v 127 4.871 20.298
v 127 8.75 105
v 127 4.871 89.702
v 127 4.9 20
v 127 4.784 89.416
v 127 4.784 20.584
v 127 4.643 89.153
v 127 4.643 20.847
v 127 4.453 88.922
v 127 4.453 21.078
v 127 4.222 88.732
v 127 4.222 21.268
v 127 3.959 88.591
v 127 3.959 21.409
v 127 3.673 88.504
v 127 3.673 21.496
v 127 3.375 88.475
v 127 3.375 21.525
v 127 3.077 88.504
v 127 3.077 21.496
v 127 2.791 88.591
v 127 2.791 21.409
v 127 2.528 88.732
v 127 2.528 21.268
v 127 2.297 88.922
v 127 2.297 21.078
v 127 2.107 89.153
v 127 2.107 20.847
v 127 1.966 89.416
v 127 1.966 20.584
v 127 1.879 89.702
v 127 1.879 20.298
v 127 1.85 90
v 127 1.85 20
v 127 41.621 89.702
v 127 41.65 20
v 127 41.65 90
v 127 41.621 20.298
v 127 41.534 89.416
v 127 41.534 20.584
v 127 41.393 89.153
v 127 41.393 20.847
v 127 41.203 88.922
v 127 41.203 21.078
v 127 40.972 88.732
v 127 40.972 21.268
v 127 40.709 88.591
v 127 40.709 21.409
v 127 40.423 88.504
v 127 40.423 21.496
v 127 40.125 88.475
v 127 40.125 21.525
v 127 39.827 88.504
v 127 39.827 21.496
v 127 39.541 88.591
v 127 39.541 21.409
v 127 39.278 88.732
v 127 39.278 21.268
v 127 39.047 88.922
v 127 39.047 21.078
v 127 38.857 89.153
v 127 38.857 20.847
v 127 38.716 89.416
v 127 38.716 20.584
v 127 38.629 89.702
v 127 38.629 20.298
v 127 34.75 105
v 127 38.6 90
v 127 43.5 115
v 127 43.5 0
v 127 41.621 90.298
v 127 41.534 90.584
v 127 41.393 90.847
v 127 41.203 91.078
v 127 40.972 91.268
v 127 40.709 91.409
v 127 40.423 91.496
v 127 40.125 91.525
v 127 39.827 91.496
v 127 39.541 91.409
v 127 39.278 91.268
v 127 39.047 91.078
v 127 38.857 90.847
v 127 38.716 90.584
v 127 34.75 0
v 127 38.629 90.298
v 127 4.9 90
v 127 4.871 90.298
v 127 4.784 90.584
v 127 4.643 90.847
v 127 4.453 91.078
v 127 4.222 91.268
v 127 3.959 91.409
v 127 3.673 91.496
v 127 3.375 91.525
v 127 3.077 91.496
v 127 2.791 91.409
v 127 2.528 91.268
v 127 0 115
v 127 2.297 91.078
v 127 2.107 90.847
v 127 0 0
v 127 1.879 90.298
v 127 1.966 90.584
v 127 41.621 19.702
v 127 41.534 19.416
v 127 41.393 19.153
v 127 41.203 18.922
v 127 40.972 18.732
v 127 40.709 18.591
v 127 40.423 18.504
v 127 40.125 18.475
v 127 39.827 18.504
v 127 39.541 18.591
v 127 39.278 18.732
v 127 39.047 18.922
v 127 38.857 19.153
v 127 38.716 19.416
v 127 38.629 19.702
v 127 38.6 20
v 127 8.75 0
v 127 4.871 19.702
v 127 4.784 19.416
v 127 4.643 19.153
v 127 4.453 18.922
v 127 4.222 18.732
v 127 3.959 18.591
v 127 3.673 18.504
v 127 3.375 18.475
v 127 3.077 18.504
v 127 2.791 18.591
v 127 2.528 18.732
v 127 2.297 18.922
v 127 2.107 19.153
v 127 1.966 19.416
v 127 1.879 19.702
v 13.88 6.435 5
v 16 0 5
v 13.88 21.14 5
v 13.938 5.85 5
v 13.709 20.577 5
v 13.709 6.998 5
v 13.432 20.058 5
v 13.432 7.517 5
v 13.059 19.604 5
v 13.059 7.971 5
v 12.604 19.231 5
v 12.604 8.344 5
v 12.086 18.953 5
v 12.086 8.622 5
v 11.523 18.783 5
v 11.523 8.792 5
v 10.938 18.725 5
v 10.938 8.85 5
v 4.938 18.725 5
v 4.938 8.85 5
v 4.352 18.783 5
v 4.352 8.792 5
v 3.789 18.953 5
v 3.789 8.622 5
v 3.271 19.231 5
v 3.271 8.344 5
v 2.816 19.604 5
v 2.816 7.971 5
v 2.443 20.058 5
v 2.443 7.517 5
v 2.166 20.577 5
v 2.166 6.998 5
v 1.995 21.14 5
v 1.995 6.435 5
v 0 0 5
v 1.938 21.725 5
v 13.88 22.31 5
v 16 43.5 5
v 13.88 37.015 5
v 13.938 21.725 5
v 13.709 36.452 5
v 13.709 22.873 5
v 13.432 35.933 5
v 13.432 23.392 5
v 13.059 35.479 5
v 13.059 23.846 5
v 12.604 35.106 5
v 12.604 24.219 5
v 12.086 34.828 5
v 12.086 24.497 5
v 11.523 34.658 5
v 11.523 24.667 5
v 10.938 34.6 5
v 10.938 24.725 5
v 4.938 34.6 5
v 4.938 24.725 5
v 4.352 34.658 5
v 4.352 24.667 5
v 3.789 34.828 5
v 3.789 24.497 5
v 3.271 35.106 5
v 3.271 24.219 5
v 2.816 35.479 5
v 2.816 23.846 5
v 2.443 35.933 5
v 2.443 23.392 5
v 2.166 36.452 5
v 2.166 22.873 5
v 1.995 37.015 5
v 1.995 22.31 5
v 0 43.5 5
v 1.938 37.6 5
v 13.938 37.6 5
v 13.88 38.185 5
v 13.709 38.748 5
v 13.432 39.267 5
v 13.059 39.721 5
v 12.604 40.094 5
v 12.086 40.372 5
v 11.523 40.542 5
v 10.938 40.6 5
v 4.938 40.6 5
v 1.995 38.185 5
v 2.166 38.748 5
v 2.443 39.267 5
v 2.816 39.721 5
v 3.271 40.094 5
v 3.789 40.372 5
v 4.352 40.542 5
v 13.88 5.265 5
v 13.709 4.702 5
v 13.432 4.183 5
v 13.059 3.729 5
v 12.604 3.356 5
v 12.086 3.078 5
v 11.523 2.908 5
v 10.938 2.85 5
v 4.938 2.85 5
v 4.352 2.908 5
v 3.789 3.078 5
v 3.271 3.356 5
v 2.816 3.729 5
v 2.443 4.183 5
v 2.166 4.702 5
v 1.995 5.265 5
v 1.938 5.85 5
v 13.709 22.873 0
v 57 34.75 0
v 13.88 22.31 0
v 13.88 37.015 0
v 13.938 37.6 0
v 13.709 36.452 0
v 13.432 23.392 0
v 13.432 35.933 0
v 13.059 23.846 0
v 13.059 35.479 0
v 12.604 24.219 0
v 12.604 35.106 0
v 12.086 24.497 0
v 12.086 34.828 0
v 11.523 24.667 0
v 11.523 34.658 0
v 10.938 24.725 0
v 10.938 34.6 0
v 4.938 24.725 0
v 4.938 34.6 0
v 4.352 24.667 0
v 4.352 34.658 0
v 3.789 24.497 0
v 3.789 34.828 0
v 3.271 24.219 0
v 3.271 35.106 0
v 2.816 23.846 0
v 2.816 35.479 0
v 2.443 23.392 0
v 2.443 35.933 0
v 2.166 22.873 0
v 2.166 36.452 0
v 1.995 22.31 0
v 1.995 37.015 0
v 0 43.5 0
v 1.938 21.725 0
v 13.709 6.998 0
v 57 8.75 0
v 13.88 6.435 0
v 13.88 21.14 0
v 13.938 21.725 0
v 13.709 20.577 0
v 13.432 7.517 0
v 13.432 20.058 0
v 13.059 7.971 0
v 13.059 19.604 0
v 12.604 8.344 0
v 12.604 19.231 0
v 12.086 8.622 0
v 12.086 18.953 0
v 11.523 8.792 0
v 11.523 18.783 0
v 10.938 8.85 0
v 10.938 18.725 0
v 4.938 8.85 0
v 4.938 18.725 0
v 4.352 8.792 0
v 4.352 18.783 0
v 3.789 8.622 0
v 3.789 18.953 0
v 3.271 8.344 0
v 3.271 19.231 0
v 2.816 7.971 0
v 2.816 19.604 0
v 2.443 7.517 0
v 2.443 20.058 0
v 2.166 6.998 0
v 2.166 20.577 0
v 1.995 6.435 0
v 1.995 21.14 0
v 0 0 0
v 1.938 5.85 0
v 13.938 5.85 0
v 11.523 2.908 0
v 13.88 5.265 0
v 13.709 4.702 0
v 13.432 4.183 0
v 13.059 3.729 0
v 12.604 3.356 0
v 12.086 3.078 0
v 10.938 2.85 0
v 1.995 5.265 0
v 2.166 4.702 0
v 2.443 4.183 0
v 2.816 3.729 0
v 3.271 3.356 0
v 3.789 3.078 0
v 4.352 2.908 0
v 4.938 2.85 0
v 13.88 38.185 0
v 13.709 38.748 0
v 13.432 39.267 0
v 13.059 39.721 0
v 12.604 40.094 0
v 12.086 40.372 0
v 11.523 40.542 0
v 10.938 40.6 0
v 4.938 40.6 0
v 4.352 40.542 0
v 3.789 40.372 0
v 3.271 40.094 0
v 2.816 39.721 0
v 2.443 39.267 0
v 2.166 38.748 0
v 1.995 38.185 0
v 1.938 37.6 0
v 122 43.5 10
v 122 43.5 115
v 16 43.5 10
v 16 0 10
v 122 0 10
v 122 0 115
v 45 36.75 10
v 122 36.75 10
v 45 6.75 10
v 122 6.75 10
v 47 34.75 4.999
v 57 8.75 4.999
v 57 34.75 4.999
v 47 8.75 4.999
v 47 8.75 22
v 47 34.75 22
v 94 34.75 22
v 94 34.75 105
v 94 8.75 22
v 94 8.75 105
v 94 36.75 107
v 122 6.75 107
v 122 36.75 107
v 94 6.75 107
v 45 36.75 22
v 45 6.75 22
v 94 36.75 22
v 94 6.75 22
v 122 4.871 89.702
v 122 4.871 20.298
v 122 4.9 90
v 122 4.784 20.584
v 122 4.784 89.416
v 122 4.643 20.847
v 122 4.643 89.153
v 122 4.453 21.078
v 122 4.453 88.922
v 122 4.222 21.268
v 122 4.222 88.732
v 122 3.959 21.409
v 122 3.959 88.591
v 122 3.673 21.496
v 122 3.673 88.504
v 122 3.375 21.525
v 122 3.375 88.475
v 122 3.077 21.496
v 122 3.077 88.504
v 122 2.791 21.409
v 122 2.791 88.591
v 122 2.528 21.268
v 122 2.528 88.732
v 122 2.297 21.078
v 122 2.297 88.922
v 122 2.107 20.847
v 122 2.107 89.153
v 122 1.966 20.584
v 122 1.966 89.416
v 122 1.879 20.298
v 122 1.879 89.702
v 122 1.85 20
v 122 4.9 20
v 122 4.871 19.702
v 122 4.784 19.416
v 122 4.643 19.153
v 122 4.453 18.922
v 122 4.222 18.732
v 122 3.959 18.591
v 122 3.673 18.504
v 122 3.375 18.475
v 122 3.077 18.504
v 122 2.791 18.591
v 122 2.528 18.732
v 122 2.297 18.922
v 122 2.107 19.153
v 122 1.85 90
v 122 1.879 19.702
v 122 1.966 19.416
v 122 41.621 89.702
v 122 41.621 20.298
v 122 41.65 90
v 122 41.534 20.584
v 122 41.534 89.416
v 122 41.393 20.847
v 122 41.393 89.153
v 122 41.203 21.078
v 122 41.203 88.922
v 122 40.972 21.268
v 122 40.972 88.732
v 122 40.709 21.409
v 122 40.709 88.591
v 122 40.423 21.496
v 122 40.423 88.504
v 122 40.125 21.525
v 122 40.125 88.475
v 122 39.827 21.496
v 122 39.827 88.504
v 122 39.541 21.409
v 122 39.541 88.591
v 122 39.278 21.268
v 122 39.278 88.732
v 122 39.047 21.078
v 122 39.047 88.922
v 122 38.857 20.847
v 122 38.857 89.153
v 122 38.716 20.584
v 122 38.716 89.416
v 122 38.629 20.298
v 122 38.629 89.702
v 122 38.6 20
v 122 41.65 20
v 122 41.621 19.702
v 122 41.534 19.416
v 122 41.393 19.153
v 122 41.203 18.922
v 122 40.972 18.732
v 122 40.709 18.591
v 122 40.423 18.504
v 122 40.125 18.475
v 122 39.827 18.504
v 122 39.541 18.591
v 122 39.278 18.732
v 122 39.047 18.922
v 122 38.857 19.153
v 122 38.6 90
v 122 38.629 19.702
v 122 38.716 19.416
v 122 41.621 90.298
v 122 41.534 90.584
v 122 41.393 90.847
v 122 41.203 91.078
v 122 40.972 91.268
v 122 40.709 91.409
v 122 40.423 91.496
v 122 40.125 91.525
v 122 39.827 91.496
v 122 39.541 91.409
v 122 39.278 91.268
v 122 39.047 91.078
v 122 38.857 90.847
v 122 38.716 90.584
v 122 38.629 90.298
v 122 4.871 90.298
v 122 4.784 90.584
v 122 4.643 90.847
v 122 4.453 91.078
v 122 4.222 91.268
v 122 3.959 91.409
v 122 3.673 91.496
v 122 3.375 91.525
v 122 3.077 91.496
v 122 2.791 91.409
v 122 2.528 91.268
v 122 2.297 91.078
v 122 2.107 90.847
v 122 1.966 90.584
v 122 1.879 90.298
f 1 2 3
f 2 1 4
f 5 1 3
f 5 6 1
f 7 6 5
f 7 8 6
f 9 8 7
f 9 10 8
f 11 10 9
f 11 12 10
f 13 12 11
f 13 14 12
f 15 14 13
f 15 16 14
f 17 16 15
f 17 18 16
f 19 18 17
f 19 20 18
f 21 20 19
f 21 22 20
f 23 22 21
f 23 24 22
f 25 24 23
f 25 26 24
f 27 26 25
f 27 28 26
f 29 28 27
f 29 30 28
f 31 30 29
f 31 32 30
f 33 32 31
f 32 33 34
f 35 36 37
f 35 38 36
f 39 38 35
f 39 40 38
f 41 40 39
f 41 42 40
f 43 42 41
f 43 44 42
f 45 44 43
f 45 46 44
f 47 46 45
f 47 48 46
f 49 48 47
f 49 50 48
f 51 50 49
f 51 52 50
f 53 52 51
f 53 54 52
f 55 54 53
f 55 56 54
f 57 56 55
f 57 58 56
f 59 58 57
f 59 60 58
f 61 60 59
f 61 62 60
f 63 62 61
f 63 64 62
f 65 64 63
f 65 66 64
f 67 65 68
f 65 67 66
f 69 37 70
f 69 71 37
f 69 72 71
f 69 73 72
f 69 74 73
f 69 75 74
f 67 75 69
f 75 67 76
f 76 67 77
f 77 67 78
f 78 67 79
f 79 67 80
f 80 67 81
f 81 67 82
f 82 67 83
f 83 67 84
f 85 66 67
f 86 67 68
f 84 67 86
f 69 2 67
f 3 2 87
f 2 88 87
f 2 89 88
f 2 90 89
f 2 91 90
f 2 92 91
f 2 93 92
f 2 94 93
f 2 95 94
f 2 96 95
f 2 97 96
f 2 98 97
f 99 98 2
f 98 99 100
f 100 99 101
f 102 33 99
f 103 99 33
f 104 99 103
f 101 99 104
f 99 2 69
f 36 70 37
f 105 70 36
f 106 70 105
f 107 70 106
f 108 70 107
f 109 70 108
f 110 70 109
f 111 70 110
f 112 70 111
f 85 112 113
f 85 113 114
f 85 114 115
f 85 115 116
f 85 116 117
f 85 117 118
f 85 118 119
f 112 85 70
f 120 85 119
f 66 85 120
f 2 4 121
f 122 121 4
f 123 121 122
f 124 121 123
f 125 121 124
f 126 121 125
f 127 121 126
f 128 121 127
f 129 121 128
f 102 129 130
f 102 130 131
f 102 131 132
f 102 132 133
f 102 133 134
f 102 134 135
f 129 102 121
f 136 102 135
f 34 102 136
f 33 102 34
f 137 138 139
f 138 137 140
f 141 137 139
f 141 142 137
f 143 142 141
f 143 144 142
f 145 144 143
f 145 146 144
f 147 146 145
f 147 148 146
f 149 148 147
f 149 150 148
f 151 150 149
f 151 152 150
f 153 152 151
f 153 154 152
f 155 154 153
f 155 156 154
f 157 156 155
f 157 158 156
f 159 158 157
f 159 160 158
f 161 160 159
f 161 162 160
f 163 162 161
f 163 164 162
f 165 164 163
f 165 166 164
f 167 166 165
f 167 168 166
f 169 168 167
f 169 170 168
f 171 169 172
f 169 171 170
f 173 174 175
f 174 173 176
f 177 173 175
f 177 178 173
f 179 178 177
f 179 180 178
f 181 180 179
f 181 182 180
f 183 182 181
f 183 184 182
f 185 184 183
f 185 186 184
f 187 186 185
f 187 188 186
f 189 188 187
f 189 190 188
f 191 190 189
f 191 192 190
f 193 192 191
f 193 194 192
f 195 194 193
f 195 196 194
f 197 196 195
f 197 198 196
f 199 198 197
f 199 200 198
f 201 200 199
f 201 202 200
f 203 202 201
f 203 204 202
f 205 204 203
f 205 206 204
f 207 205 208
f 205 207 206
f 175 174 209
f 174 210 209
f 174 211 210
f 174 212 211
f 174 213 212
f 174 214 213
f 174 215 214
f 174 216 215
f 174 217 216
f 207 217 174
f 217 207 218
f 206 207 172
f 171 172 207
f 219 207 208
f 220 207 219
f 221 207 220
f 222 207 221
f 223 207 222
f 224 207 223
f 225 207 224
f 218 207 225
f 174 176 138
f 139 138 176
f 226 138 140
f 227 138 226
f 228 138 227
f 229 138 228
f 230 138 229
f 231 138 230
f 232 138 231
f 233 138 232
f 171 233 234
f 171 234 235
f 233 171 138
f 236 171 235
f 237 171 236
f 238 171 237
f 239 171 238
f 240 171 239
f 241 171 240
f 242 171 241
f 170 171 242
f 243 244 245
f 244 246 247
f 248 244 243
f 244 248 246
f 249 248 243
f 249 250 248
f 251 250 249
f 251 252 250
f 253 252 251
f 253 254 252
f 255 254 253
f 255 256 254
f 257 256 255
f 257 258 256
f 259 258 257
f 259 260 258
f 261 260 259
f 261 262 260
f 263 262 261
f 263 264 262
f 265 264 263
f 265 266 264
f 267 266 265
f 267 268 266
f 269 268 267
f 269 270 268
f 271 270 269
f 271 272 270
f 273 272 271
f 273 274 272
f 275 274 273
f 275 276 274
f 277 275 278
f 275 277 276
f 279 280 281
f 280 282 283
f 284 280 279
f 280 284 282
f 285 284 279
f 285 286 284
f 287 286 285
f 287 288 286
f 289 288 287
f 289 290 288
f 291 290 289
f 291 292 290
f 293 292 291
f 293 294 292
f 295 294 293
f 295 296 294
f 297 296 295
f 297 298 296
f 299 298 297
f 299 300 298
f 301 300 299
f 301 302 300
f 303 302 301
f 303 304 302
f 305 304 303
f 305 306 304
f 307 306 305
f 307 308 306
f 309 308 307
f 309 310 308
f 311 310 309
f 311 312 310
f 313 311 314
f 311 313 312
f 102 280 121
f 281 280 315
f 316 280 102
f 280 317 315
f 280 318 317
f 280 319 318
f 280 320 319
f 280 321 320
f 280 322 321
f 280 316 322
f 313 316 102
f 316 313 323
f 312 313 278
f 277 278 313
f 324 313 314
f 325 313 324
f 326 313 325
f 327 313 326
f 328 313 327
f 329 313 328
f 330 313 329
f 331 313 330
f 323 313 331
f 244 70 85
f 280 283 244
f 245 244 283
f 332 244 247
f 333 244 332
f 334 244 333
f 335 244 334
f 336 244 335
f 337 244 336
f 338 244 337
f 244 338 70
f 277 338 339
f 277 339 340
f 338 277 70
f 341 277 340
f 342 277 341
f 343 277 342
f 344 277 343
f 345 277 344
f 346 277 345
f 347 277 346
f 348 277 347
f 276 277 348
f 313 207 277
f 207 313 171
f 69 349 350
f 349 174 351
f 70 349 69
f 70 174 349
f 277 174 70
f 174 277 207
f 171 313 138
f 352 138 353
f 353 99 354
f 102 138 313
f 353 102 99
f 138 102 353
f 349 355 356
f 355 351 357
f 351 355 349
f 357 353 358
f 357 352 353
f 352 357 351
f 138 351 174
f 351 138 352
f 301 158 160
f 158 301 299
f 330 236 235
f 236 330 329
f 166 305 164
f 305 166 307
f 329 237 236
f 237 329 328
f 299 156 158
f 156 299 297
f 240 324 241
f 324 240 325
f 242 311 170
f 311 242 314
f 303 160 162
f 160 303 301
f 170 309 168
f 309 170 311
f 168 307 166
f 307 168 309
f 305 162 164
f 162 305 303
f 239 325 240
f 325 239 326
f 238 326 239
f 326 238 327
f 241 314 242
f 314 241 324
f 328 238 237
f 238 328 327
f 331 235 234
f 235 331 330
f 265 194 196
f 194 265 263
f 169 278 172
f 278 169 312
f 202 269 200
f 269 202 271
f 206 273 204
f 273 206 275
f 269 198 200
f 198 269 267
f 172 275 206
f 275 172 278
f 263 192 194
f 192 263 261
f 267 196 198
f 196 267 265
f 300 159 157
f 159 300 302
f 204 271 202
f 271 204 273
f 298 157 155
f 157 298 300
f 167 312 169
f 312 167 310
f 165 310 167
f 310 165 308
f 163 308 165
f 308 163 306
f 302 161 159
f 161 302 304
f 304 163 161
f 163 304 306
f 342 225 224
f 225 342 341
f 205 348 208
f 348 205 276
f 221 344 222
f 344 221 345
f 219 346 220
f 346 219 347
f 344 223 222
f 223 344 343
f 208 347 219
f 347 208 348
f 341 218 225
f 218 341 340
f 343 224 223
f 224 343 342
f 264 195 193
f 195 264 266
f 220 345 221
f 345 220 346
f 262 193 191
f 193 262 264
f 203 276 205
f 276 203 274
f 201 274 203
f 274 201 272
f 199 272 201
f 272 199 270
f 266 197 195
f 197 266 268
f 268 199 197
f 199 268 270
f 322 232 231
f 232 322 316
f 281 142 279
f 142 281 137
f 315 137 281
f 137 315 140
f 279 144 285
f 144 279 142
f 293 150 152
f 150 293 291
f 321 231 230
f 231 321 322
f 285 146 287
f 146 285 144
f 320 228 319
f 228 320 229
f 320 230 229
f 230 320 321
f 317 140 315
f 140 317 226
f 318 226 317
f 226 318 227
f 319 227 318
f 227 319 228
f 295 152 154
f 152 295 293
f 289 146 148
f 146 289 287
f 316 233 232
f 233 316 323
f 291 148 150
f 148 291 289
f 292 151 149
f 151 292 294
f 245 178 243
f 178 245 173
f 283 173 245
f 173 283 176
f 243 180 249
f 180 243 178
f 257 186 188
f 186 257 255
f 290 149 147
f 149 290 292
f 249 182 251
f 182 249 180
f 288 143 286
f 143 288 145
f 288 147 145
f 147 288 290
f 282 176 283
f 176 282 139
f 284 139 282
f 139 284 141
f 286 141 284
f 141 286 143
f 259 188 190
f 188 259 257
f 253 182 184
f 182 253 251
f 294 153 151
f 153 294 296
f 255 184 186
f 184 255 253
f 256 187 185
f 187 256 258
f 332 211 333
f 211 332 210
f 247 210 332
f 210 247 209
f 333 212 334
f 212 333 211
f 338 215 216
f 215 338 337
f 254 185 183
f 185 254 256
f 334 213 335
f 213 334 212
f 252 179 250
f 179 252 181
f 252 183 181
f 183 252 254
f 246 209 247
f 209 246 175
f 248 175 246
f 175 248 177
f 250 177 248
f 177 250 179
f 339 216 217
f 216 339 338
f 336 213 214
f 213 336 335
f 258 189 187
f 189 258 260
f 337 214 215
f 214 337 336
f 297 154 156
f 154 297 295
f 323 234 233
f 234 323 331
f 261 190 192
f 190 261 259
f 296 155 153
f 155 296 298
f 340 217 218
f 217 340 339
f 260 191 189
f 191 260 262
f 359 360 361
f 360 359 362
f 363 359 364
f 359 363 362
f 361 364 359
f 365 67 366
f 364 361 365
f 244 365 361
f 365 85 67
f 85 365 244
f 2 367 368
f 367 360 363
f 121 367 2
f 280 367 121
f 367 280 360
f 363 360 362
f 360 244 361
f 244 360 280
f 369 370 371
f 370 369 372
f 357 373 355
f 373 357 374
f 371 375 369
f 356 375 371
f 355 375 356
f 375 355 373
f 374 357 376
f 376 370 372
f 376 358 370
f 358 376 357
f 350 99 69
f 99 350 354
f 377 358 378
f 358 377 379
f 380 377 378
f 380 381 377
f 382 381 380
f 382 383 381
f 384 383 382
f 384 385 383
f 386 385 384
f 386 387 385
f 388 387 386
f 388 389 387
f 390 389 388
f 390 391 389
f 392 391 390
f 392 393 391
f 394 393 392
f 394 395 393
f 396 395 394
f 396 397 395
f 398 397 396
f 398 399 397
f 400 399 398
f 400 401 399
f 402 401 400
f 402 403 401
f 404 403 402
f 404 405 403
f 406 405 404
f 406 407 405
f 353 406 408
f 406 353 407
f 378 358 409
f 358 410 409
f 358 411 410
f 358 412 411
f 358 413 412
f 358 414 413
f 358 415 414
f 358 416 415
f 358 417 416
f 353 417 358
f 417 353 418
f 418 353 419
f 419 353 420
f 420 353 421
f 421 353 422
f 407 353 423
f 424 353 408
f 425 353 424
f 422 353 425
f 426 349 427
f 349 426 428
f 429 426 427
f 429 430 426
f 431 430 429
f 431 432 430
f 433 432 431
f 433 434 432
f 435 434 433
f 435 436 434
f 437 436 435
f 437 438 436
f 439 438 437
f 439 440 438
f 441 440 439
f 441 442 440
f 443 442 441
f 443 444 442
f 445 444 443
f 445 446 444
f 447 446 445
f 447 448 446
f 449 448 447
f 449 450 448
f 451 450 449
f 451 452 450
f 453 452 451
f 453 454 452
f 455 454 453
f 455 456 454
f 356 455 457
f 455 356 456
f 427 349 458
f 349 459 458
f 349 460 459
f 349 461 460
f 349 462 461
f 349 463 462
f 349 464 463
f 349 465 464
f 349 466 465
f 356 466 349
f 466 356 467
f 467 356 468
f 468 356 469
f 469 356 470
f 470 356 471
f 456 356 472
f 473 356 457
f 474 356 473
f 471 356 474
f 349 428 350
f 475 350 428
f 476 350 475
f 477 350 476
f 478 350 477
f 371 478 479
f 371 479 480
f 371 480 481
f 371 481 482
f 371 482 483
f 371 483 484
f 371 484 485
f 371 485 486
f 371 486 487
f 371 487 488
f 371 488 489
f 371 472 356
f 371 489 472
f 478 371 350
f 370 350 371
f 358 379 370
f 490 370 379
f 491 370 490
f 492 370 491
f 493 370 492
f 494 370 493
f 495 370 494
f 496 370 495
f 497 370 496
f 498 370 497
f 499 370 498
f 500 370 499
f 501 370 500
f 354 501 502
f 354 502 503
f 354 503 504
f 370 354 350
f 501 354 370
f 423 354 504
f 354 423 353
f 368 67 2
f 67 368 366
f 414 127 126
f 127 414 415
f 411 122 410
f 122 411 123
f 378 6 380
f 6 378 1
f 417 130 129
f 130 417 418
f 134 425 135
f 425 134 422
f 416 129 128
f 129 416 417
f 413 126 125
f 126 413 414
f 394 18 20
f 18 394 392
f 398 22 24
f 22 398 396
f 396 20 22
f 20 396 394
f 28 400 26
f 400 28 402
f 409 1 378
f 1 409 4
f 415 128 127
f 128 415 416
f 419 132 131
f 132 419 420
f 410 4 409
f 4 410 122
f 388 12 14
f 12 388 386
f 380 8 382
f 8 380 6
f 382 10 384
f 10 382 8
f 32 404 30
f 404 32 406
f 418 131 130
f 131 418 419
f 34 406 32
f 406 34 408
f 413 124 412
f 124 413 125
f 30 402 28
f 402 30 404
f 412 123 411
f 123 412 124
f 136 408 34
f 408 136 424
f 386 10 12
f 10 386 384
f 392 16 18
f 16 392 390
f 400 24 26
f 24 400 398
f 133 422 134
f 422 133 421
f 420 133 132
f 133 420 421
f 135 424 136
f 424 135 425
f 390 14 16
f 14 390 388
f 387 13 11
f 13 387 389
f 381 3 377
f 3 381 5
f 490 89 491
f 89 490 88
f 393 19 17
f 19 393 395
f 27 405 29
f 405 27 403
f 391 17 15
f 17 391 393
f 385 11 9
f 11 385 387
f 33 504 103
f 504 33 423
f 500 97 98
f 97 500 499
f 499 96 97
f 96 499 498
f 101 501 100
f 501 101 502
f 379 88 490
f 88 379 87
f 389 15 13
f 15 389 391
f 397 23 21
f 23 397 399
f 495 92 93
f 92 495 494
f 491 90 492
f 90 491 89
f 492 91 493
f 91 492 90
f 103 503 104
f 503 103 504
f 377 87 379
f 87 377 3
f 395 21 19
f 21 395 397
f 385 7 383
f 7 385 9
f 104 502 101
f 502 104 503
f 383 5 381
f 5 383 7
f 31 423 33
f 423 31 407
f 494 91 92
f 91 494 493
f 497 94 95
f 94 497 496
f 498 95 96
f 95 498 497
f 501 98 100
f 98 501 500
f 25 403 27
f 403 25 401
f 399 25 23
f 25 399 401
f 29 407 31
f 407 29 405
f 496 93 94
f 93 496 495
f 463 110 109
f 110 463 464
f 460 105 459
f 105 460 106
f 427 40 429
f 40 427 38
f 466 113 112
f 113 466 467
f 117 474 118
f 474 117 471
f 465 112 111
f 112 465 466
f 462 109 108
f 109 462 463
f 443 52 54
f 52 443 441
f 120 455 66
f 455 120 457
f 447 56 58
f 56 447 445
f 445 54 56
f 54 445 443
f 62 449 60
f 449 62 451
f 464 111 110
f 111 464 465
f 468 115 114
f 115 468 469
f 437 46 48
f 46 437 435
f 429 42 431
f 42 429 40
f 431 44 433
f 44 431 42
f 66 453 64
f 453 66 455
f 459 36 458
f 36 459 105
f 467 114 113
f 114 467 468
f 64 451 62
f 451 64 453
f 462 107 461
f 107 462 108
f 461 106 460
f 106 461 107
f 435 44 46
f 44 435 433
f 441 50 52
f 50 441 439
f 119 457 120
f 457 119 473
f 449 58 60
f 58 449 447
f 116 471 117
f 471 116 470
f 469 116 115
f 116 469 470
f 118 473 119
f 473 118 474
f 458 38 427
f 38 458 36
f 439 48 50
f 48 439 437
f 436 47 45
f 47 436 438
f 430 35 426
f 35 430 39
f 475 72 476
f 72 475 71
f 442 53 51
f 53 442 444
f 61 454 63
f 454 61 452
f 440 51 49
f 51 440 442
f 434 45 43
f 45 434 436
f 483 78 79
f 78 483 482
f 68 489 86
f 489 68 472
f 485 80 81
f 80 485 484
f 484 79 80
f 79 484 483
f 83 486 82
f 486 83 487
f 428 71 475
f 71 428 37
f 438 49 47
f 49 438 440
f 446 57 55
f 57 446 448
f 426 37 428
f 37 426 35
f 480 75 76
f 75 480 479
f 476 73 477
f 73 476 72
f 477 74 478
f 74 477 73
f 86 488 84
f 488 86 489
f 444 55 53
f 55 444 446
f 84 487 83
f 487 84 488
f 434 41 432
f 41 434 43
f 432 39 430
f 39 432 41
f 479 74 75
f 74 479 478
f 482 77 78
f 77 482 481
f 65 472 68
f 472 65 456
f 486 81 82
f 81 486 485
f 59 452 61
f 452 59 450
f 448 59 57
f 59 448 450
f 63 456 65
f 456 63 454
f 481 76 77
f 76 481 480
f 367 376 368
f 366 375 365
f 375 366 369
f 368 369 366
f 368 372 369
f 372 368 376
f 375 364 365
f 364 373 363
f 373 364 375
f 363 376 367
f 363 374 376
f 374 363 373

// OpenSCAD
// file: ../front.scad
// Medio frontal sin solapas
module front() {
    screw_hole_diameter = 6;
    difference(){
        union() {
            cube([254 / 2,43.5, 5]);
            translate([16, 0, 0]) cube([(254 / 2) - 16, 43.5, 10]);
        }
        translate([15.875/2, -0.5, 0]) {
            for (j=[-screw_hole_diameter/2:screw_hole_diameter:screw_hole_diameter/2]) {
                translate([j,6.35,-0.001]) cylinder(d = screw_hole_diameter, h = 5 + 0.002, center = false, $fn = 32);                
                translate([j,6.35 + 15.875,-0.001]) cylinder(d = screw_hole_diameter, h = 5 + 0.002, center = false, $fn = 32);
                translate([j,6.35 + 15.875 + 15.875,-0.001]) cylinder(d = screw_hole_diameter, h = 5 + 0.002, center = false, $fn = 32);
            }
            translate([-screw_hole_diameter / 2,6.35 - screw_hole_diameter / 2,-0.001]) cube([screw_hole_diameter, screw_hole_diameter, 5 + 0.002], center = false);
            translate([-screw_hole_diameter / 2,6.35 + 15.875 - screw_hole_diameter / 2,-0.001]) cube([screw_hole_diameter, screw_hole_diameter, 5 + 0.002], center = false);
            translate([-screw_hole_diameter / 2,6.35 + 15.875 + 15.875 - screw_hole_diameter / 2,-0.001]) cube([screw_hole_diameter, screw_hole_diameter, 5 + 0.002], center = false);
        }
    }
}

// Medio frontal con solapas
module front2() {
    union(){
        front();
        // Solapa para añadir la otra mitad del frontal
        difference() {
            translate([254/2 - 5, 0, 0]) cube([5, 43.5, 20]);
            translate([254/2, 10, 15]) rotate([0,90,0]) cylinder(d = 3.25, h = 12, center = true, $fn = 32);
            translate([254/2, 43.5 - 10, 15]) rotate([0,90,0]) cylinder(d = 3.25, h = 12, center = true, $fn = 32);
            translate([254/2 - 3 - 0.001, 10, 15]) rotate([0,90,0]) cylinder(d = 6.25, h = 4, center = true, $fn = 6);
            translate([254/2 - 3 - 0.001, 43.5 - 10, 15]) rotate([0,90,0]) cylinder(d = 6.25, h = 4, center = true, $fn = 6);
        }
    }
}
// main file
include <../front.scad>

module tplink(){    
    difference(){
        front();
        translate([(254/2) - 80,(43.5 - 26) / 2, 5 - 0.001]) cube([80 + 0.001,26, 5 + 0.002]);
        translate([(254/2) - 70,(43.5 - 26) / 2, -0.001]) cube([70 + 0.001,26, 5 + 0.002]);
    }
    difference(){
        union() {
            translate([(254/2) - 82, (43.5 - 30) / 2, 5]) cube([82, 30, 102]);
            translate([(254/2) - 5, 0, 5]) cube([5, 43.5, 110]);
        }
        translate([(254/2) - 80, (43.5 - 30) / 2 + 2, 5 -0.001]) cube([80 + 0.001, 26, 100 + 0.001]);        
        translate([254/2,(43.5 - 30) / 4, 20]) rotate([0,90,0]) cylinder(d = 3.05, h = 20, center = true, $fn = 32);
        translate([254/2,(43.5 - 30) / 4, 110 - 20]) rotate([0,90,0]) cylinder(d = 3.05, h = 20, center = true, $fn = 32);     
        translate([254/2,43.5 - (43.5 - 30) / 4, 20]) rotate([0,90,0]) cylinder(d = 3.05, h = 20, center = true, $fn = 32);
        translate([254/2,43.5 - (43.5 - 30) / 4, 110 - 20]) rotate([0,90,0]) cylinder(d = 3.05, h = 20, center = true, $fn = 32);     
        translate([(254/2) - 83,0,22]) cube([50,43.5,100]);
    }
}

tplink();
